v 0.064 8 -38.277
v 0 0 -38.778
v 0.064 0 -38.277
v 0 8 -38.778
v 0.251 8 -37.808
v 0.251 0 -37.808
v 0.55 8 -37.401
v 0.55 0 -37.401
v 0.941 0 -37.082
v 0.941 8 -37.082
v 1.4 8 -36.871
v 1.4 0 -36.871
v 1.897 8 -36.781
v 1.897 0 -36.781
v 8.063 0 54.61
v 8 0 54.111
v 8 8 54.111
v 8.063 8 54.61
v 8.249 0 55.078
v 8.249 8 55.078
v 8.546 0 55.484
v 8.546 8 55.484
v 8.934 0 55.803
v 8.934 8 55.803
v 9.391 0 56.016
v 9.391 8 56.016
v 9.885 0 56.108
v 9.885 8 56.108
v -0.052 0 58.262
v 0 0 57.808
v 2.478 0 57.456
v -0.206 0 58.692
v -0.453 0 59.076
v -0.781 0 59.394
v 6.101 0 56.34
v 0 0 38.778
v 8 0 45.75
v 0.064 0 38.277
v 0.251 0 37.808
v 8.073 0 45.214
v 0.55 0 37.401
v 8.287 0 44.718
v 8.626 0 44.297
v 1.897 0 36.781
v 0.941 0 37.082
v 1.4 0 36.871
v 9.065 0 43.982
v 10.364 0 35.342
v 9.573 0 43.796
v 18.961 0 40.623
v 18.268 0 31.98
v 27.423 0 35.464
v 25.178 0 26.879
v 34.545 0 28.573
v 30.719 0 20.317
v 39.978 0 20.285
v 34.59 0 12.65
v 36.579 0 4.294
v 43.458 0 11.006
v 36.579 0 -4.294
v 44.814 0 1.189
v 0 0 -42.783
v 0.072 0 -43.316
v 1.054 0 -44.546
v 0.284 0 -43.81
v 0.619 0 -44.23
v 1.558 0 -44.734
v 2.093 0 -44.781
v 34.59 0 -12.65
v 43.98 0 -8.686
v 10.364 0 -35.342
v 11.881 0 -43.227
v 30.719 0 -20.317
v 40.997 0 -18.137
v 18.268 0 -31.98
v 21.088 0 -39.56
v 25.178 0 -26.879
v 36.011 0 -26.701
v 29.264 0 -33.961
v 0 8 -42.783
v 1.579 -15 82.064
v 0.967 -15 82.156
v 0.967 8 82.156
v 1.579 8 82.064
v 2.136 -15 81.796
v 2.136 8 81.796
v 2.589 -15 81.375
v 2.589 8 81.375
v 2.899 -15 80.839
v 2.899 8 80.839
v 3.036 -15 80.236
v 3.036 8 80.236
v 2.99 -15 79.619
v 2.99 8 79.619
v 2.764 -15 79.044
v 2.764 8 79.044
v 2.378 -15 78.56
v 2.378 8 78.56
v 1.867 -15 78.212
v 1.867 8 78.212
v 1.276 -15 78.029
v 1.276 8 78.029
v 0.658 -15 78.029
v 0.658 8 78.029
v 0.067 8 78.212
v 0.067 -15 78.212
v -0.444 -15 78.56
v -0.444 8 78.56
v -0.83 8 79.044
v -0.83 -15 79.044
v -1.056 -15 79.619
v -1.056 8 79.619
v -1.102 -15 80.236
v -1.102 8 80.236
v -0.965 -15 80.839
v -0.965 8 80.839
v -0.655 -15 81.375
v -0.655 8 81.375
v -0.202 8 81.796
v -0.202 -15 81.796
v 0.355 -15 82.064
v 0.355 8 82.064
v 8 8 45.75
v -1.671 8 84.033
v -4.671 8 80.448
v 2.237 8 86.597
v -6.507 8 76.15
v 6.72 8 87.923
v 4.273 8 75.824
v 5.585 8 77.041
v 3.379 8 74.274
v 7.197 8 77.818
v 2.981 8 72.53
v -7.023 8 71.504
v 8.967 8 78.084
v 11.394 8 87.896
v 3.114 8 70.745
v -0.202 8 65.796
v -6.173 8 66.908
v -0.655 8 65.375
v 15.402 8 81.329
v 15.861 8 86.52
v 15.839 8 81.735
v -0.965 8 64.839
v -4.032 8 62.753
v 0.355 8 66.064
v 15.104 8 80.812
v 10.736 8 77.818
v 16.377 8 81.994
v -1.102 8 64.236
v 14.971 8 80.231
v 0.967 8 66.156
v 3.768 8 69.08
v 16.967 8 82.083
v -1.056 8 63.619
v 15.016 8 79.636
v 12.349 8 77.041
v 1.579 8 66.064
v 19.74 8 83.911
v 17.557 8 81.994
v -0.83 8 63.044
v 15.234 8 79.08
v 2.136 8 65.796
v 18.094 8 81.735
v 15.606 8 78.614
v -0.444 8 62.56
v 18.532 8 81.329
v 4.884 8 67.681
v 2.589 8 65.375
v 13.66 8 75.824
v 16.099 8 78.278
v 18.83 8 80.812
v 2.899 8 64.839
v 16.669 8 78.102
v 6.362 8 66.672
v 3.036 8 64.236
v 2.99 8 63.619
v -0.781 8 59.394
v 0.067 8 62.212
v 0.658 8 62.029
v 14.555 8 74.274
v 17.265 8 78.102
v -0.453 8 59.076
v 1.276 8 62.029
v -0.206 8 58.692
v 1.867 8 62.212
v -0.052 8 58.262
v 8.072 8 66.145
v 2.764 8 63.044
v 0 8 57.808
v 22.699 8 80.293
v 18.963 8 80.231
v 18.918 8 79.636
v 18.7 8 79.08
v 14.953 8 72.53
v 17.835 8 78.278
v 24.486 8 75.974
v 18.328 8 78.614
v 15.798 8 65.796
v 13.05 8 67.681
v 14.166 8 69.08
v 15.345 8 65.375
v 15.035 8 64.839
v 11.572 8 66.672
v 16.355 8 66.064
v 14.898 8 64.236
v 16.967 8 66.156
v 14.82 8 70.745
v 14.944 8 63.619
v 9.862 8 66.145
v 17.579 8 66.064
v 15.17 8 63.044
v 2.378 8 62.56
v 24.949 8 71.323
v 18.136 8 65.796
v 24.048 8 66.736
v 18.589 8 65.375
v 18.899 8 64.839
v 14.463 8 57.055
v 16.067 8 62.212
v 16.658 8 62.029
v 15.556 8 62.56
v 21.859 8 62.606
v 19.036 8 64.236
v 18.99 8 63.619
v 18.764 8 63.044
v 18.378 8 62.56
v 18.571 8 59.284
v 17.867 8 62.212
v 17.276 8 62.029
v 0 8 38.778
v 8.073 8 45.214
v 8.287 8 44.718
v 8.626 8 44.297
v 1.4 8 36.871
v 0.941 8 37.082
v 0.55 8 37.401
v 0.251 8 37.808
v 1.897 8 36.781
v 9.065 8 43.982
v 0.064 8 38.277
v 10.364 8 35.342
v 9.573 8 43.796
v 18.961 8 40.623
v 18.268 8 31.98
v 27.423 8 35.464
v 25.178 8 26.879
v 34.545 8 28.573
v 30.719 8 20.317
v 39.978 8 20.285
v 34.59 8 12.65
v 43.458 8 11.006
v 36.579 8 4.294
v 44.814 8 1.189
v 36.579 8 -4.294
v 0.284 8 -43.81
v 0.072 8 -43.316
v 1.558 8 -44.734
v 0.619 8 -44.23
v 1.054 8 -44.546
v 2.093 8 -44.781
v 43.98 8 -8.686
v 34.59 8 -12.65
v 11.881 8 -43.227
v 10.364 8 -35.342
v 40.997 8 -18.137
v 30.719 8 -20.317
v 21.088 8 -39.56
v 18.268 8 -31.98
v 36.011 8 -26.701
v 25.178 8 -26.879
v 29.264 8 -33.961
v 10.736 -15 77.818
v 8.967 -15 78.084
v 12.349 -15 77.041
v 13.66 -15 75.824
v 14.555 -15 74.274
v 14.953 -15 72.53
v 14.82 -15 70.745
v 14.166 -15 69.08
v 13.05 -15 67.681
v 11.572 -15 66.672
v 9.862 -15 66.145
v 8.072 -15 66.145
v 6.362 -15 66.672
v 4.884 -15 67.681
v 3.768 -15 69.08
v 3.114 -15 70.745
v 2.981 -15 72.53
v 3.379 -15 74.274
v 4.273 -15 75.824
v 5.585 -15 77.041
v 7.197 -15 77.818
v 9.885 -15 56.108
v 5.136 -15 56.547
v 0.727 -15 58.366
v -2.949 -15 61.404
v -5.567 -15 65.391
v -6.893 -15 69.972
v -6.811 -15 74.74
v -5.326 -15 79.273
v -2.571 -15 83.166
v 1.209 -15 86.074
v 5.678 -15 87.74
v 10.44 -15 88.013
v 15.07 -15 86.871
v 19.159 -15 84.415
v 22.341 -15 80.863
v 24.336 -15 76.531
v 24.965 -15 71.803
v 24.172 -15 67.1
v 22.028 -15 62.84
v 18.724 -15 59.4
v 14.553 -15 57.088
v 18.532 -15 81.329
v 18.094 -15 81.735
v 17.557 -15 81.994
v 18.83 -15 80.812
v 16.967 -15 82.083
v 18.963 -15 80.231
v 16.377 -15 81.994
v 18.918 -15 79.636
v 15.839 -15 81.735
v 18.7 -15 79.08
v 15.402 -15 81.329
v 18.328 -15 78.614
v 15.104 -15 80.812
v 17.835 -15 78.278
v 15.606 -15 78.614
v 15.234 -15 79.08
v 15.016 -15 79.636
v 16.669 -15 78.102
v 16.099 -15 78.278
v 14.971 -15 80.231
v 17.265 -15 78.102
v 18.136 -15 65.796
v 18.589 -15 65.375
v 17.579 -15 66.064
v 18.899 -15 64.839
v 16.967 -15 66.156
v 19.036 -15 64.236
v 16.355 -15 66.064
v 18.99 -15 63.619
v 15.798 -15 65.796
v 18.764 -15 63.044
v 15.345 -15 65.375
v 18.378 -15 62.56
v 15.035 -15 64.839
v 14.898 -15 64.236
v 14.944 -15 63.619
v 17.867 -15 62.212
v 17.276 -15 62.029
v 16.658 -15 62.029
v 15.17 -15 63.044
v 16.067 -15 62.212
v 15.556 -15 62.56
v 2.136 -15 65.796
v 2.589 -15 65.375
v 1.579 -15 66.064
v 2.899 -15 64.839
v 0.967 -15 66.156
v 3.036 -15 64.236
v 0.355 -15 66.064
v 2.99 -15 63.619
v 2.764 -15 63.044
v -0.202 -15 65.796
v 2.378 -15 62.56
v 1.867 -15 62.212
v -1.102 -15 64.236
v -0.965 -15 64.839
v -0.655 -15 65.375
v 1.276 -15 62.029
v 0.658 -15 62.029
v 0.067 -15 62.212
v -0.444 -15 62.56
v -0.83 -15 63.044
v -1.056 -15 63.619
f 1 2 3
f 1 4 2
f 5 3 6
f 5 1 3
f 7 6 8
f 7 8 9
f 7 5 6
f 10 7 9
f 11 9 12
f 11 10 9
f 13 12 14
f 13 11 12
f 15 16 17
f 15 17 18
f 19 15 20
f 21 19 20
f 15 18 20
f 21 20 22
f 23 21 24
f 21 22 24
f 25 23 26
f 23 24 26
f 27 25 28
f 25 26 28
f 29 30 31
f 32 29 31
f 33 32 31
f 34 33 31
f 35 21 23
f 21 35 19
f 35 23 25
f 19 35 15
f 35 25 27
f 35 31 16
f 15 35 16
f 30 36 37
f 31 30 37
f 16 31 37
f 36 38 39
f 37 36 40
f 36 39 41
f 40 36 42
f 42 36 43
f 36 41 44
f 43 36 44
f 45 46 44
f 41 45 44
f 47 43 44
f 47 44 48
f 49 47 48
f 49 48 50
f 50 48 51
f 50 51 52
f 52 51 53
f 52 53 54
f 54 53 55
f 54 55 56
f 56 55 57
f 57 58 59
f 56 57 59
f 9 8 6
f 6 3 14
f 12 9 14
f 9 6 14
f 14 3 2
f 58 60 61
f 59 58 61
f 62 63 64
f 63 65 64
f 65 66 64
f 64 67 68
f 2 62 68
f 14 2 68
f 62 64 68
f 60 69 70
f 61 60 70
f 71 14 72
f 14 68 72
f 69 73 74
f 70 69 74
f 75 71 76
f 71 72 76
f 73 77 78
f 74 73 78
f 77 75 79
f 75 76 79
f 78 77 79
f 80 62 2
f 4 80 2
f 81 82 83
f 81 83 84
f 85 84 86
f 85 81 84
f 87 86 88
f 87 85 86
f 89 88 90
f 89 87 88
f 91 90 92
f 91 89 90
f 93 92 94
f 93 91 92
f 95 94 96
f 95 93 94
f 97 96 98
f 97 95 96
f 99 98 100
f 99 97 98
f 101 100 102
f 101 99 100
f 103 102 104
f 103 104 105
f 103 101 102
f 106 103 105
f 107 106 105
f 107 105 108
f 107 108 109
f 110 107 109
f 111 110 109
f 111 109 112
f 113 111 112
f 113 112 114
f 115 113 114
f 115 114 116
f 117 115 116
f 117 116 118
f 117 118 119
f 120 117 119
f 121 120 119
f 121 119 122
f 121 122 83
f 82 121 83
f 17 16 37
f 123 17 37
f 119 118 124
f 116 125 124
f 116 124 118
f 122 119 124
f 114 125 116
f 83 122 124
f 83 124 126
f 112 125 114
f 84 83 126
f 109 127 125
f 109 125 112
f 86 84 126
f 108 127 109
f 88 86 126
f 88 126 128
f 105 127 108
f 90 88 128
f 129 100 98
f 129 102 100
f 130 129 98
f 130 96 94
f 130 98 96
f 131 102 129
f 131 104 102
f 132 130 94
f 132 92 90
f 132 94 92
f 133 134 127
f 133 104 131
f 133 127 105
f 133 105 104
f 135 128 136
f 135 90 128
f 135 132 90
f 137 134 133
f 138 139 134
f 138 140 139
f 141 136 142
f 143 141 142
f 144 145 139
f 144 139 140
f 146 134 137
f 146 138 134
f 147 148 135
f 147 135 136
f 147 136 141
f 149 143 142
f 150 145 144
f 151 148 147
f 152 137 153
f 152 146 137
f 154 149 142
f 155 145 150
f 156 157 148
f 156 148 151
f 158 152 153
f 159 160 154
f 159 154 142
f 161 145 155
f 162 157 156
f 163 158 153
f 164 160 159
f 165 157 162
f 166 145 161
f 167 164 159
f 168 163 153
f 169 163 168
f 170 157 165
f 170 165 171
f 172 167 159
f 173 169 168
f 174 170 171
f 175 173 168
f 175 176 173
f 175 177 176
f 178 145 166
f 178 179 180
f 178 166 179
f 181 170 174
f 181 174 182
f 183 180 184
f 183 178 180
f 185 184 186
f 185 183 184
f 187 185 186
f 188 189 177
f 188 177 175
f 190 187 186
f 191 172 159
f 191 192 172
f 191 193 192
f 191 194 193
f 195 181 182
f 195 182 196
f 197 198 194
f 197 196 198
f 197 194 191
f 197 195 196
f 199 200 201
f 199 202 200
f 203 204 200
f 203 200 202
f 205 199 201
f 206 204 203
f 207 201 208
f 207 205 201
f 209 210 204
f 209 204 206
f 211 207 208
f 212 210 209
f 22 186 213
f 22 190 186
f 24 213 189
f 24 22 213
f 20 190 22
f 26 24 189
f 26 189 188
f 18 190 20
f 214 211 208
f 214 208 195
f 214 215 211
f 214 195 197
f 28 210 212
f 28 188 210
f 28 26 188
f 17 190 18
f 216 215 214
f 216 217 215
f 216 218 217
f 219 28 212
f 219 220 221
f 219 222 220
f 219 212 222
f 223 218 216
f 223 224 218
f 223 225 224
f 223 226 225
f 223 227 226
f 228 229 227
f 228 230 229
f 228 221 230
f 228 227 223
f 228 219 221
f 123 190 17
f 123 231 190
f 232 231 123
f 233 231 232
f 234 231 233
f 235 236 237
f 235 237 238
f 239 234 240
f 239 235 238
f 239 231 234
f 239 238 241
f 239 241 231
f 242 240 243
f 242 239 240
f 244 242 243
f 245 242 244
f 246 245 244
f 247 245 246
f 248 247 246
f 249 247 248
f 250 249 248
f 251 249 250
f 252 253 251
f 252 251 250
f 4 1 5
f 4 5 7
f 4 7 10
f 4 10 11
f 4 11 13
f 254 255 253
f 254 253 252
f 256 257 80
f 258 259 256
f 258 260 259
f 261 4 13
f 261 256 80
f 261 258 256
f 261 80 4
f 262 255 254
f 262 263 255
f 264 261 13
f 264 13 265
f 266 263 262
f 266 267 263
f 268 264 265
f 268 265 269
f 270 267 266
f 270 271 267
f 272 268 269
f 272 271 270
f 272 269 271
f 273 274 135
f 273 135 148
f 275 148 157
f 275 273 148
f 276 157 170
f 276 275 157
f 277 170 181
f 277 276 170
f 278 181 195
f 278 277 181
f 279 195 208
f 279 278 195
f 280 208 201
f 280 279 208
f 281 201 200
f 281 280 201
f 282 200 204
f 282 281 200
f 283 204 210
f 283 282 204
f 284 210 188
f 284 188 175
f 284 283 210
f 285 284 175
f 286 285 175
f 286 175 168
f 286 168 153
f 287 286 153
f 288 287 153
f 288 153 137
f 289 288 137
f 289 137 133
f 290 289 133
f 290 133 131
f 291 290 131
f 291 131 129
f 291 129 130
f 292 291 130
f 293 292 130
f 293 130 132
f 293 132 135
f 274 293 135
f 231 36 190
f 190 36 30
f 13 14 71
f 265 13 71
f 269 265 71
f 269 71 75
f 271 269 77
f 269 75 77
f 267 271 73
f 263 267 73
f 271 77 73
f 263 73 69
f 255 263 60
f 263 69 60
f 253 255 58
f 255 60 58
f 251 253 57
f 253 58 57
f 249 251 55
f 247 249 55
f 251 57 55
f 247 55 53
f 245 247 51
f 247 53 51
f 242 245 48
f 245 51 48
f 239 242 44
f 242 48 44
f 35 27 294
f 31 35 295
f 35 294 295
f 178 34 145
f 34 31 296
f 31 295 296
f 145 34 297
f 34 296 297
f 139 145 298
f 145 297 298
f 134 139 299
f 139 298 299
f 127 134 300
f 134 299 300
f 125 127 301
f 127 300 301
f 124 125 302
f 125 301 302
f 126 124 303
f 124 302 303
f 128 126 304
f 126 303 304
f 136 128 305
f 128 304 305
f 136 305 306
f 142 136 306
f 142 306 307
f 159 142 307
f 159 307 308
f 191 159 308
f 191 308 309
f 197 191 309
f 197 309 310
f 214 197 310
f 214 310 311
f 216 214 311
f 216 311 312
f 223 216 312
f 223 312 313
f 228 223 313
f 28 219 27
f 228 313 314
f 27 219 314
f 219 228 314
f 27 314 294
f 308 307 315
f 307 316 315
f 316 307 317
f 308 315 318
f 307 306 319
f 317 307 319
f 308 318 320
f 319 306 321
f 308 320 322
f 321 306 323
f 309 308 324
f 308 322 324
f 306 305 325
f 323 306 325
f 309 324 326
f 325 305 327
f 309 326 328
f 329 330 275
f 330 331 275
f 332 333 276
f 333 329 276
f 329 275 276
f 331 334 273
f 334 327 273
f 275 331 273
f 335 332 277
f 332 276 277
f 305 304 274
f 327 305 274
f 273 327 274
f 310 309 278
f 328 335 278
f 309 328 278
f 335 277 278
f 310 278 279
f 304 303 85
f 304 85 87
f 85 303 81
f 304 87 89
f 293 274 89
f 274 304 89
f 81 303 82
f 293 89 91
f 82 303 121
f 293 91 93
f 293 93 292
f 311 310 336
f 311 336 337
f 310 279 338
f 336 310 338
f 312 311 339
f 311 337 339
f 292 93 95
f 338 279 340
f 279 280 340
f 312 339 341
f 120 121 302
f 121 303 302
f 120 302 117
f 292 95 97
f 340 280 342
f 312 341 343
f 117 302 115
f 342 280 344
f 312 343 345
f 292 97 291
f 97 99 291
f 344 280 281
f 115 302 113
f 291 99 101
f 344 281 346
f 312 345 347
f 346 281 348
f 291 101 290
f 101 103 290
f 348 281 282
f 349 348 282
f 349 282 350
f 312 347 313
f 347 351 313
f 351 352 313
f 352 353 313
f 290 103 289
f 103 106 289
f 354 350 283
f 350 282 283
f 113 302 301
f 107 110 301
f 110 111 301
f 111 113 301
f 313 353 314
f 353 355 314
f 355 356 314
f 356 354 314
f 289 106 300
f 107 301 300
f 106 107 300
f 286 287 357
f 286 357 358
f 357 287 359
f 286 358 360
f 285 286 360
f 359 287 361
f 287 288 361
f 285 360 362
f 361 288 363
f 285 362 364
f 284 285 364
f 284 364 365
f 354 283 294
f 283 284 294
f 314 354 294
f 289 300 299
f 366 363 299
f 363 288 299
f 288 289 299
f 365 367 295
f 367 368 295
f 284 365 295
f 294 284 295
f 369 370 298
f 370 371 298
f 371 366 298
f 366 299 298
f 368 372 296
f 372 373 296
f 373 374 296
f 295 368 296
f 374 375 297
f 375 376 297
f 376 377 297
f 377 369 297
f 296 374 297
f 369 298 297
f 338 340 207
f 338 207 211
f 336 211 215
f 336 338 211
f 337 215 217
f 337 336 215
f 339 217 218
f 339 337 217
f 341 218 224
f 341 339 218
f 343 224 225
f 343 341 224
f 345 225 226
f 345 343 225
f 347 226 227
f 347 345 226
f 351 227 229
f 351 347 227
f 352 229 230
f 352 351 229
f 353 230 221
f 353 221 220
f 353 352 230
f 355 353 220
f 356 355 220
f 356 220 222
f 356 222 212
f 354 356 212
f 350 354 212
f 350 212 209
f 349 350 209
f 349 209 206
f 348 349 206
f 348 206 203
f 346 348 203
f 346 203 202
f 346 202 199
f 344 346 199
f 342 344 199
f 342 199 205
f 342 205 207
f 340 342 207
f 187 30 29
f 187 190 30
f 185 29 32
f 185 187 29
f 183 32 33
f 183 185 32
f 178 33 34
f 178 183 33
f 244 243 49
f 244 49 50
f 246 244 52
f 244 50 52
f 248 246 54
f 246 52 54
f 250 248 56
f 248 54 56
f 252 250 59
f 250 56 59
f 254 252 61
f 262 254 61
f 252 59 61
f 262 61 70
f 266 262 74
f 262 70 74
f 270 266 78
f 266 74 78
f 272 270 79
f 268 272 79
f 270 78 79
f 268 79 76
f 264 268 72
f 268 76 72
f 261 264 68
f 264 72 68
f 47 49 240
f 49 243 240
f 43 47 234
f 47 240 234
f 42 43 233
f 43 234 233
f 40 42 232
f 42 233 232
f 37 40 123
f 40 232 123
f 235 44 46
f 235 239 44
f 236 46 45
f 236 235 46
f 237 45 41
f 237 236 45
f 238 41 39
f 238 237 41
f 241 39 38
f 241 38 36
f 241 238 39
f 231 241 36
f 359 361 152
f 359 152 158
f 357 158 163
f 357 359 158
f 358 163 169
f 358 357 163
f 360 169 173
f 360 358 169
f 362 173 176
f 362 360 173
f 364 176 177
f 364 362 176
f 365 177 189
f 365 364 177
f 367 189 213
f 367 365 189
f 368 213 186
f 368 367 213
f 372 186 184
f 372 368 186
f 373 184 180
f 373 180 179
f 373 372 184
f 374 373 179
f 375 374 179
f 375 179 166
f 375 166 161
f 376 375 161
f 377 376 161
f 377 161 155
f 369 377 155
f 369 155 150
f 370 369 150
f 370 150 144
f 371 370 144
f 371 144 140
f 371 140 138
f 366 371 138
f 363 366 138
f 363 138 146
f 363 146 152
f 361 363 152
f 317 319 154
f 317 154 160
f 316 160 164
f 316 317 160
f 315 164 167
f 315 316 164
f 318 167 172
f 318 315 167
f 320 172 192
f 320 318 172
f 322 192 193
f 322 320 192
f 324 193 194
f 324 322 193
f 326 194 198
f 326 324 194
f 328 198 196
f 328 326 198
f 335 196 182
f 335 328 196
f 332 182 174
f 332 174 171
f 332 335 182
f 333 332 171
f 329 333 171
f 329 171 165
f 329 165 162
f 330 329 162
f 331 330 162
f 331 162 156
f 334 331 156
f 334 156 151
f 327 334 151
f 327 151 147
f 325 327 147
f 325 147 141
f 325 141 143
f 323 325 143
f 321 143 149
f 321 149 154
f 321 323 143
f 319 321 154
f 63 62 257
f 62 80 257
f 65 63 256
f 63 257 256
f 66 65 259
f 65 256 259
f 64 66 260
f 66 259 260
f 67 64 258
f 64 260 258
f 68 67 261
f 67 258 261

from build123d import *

# Parameters (mm, degrees)
SKETCH1_R           = 2.075
SKETCH1_R_2         = 6.003208263
BOSS_EXTRUDE2_DEPTH = 8
FILLET1_R           = 2
BOSS_EXTRUDE3_START = -23
SKETCH2_R           = 16
SKETCH2_R_2         = 6.003208263
SKETCH2_R_3         = 2.001534735
SKETCH2_R_4         = 2.075
BOSS_EXTRUDE3_DEPTH = 23


with BuildPart() as part:
    # Sketch1 → Boss-Extrude2 (new body)
    with BuildSketch(Plane(origin=(0, 0, 0), x_dir=(1, 0, 0), z_dir=(0, 1, 0))):
        with BuildLine():
            Line((0, 44.83), (0, 36.83))
            ThreePointArc((0, 36.83), (36.83, 0), (0, -36.83))
            Line((0, -36.83), (0, -46.83))
            Line((0, -46.83), (0, -58.83))
            ThreePointArc((0, -58.83), (14.116701064, -87.229775601), (8, -56.110417137))
            Line((8, -56.110417137), (8, -44.110417137))
            ThreePointArc((8, -44.110417137), (44.649741882, 4.016148637), (0, 44.83))
        make_face()
        with Locations(Location((0.96696537, -64.081170969, 0), (0, 0, 270))):
            Circle(SKETCH1_R, mode=Mode.SUBTRACT)
        with Locations(Location((16.96696537, -64.081170969, 0), (0, 0, 270))):
            Circle(SKETCH1_R, mode=Mode.SUBTRACT)
        with Locations(Location((16.96696537, -80.081170969, 0), (0, 0, 270))):
            Circle(SKETCH1_R, mode=Mode.SUBTRACT)
        with Locations(Location((0.96696537, -80.081170969, 0), (0, 0, 270))):
            Circle(SKETCH1_R, mode=Mode.SUBTRACT)
        with Locations(Location((8.96696537, -72.081170969, 0), (0, 0, 270))):
            Circle(SKETCH1_R_2, mode=Mode.SUBTRACT)
    extrude(amount=BOSS_EXTRUDE2_DEPTH)

    # Fillet1
    fillet1_edges = [part.edges().sort_by_distance(p)[0] for p in [
        (0, 4, 58.83),
        (0, 4, 36.83),
        (0, 4, -36.83),
        (0, 4, -44.83),
        (8, 4, 44.110417137),
        (8, 4, 56.110417137),
    ]]
    fillet(fillet1_edges, radius=FILLET1_R)

    # Sketch2 → Boss-Extrude3 (add)
    with BuildSketch(Plane(origin=(0, 8, 0), x_dir=(1, 0, 0), z_dir=(0, 1, 0)).offset(BOSS_EXTRUDE3_START)):
        with Locations(Location((8.96696537, -72.081170969, 0), (0, 0, 86.709940875))):
            Circle(SKETCH2_R)
        with Locations(Location((8.96696537, -72.081170969, 0), (0, 0, 270))):
            Circle(SKETCH2_R_2, mode=Mode.SUBTRACT)
        with Locations(Location((16.96696537, -80.081170969, 0), (0, 0, 270))):
            Circle(SKETCH2_R_3, mode=Mode.SUBTRACT)
        with Locations(Location((16.96696537, -64.081170969, 0), (0, 0, 270))):
            Circle(SKETCH2_R_4, mode=Mode.SUBTRACT)
        with Locations(Location((0.96696537, -64.081170969, 0), (0, 0, 270))):
            Circle(SKETCH2_R_4, mode=Mode.SUBTRACT)
        with Locations(Location((0.96696537, -80.081170969, 0), (0, 0, 270))):
            Circle(SKETCH2_R_4, mode=Mode.SUBTRACT)
    extrude(amount=BOSS_EXTRUDE3_DEPTH)


solid = part.part
